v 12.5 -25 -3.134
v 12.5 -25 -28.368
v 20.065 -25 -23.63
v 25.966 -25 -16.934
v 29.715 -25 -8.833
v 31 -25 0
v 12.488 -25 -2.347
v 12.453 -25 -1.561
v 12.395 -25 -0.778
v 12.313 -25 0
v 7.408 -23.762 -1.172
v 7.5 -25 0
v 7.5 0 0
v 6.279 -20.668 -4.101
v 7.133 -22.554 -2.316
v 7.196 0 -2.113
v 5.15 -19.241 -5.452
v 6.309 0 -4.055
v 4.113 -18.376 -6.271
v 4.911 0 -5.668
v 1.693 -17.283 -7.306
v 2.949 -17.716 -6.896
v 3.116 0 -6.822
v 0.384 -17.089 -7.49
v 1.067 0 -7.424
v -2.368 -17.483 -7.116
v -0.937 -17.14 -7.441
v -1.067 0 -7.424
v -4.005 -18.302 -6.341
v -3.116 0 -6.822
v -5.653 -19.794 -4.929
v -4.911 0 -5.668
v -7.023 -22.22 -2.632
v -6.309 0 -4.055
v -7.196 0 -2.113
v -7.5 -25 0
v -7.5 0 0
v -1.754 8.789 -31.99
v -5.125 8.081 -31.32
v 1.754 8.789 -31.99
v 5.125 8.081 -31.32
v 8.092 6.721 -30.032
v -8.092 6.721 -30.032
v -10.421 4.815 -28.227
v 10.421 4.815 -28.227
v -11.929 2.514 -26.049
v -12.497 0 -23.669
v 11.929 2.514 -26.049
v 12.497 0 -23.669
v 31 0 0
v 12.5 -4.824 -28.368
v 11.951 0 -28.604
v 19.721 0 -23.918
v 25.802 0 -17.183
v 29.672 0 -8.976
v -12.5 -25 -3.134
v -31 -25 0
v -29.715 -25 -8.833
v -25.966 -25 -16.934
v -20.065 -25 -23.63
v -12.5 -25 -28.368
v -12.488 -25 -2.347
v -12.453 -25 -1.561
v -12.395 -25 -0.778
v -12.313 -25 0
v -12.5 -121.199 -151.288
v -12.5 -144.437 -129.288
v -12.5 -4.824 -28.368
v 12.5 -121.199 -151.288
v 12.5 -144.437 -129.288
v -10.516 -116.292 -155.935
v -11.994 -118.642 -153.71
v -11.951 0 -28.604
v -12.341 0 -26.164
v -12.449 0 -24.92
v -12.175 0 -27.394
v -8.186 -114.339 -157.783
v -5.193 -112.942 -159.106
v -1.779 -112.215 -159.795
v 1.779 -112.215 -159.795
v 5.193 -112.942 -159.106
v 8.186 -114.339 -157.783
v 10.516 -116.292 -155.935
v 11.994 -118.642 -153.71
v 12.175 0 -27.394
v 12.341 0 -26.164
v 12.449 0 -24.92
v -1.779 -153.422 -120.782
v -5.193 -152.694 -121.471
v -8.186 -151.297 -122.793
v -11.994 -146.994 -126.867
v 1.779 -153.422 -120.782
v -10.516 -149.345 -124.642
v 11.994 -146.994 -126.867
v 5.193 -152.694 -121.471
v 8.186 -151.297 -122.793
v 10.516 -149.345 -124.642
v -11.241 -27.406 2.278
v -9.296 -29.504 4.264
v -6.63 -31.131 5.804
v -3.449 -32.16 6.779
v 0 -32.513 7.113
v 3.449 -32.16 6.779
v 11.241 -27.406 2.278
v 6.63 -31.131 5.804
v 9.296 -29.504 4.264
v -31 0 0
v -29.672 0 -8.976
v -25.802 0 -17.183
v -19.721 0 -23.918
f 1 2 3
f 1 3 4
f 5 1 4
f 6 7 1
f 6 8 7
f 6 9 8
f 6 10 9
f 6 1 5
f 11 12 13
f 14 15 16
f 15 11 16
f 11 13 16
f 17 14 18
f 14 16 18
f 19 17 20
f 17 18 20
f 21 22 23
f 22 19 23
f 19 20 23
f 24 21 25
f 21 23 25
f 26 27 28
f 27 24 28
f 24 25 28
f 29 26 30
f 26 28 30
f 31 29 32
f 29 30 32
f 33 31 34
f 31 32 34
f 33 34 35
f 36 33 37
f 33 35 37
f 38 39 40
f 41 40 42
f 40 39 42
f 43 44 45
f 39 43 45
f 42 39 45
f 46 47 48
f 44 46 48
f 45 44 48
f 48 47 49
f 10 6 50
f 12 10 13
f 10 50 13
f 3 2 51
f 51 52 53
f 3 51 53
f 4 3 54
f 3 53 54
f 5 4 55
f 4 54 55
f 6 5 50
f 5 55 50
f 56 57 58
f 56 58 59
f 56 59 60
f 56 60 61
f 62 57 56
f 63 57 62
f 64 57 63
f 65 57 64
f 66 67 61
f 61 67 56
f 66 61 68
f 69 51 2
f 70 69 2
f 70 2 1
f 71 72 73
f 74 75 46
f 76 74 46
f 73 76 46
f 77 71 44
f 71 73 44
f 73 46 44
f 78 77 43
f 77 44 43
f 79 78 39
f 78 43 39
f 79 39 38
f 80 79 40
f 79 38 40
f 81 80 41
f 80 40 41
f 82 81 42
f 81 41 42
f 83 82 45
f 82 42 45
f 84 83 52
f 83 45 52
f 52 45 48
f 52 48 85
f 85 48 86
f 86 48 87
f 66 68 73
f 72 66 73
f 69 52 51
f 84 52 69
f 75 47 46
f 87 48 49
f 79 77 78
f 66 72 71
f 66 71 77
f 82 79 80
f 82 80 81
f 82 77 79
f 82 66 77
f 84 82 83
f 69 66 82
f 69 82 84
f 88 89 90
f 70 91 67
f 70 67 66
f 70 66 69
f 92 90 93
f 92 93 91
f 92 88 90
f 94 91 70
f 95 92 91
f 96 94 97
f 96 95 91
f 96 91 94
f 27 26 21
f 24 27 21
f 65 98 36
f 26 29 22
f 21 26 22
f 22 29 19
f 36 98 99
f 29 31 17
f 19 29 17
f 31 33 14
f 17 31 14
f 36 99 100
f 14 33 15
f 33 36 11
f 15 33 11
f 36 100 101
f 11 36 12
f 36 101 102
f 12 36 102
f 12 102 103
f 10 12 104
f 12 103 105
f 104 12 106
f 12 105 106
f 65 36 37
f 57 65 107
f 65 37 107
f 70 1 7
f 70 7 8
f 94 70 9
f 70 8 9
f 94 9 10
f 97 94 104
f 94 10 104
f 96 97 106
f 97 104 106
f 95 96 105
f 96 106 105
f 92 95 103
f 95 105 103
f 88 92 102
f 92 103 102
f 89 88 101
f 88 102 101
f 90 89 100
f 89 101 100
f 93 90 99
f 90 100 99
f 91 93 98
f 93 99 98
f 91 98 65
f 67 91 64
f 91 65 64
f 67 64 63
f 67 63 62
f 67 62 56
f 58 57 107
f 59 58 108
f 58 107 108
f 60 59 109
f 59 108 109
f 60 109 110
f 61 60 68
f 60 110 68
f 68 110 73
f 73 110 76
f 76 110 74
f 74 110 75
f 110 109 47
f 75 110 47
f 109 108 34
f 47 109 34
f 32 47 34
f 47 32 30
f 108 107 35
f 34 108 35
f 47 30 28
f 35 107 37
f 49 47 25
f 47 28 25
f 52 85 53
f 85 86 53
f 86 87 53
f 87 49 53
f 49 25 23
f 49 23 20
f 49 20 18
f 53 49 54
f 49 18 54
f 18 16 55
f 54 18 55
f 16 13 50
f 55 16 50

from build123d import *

# Parameters (mm, degrees)
F1_DEPTH = 25
F5_DEPTH = 176


with BuildPart() as f1:
    # F0 (on Front) → F1 (new body)
    with BuildSketch(Plane.XZ):
        with BuildLine():
            ThreePointArc((-31, 0), (0, -31), (31, 0))
            Line((31, 0), (7.5, 0))
            ThreePointArc((7.5, 0), (0, -7.5), (-7.5, 0))
            Line((-7.5, 0), (-31, 0))
        make_face()
    extrude(amount=F1_DEPTH)

    # F4 (on face) → F5 (join)
    with BuildSketch(Plane(origin=(0, -11.816696451, -12.4813098776), x_dir=(1, 0, 0), z_dir=(0, -0.6875084422, -0.7261763849))):
        with BuildLine():
            Line((-12.5, 16), (0, 16))
            Line((0, 16), (12.5, 16))
            ThreePointArc((12.5, 16), (0, 28.5), (-12.5, 16))
        make_face()
        with BuildLine():
            Line((0, 16), (0, 3.5))
            ThreePointArc((0, 3.5), (8.8388347648, 7.1611652352), (12.5, 16))
            Line((12.5, 16), (0, 16))
        make_face()
        with BuildLine():
            ThreePointArc((-12.5, 16), (-8.8388347648, 7.1611652352), (0, 3.5))
            Line((0, 3.5), (0, 16))
            Line((0, 16), (-12.5, 16))
        make_face()
        with BuildLine():
            Line((0, -16), (0, -3.5))
            ThreePointArc((0, -3.5), (-8.8388347648, -7.1611652352), (-12.5, -16))
            ThreePointArc((-12.5, -16), (0, -28.5), (12.5, -16))
            Line((12.5, -16), (0, -16))
        make_face()
        with BuildLine():
            Line((0, 3.5), (0, 0))
            Line((0, 0), (0, -3.5))
            ThreePointArc((0, -3.5), (8.8388347648, -7.1611652352), (12.5, -16))
            Line((12.5, -16), (12.5, 16))
            ThreePointArc((12.5, 16), (8.8388347648, 7.1611652352), (0, 3.5))
        make_face()
        with BuildLine():
            Line((0, -3.5), (0, 0))
            Line((0, 0), (0, 3.5))
            ThreePointArc((0, 3.5), (-8.8388347648, 7.1611652352), (-12.5, 16))
            Line((-12.5, 16), (-12.5, -16))
            ThreePointArc((-12.5, -16), (-8.8388347648, -7.1611652352), (0, -3.5))
        make_face()
        with BuildLine():
            ThreePointArc((12.5, -16), (8.8388347648, -7.1611652352), (0, -3.5))
            Line((0, -3.5), (0, -16))
            Line((0, -16), (12.5, -16))
        make_face()
    extrude(amount=F5_DEPTH)


solid = f1.part
